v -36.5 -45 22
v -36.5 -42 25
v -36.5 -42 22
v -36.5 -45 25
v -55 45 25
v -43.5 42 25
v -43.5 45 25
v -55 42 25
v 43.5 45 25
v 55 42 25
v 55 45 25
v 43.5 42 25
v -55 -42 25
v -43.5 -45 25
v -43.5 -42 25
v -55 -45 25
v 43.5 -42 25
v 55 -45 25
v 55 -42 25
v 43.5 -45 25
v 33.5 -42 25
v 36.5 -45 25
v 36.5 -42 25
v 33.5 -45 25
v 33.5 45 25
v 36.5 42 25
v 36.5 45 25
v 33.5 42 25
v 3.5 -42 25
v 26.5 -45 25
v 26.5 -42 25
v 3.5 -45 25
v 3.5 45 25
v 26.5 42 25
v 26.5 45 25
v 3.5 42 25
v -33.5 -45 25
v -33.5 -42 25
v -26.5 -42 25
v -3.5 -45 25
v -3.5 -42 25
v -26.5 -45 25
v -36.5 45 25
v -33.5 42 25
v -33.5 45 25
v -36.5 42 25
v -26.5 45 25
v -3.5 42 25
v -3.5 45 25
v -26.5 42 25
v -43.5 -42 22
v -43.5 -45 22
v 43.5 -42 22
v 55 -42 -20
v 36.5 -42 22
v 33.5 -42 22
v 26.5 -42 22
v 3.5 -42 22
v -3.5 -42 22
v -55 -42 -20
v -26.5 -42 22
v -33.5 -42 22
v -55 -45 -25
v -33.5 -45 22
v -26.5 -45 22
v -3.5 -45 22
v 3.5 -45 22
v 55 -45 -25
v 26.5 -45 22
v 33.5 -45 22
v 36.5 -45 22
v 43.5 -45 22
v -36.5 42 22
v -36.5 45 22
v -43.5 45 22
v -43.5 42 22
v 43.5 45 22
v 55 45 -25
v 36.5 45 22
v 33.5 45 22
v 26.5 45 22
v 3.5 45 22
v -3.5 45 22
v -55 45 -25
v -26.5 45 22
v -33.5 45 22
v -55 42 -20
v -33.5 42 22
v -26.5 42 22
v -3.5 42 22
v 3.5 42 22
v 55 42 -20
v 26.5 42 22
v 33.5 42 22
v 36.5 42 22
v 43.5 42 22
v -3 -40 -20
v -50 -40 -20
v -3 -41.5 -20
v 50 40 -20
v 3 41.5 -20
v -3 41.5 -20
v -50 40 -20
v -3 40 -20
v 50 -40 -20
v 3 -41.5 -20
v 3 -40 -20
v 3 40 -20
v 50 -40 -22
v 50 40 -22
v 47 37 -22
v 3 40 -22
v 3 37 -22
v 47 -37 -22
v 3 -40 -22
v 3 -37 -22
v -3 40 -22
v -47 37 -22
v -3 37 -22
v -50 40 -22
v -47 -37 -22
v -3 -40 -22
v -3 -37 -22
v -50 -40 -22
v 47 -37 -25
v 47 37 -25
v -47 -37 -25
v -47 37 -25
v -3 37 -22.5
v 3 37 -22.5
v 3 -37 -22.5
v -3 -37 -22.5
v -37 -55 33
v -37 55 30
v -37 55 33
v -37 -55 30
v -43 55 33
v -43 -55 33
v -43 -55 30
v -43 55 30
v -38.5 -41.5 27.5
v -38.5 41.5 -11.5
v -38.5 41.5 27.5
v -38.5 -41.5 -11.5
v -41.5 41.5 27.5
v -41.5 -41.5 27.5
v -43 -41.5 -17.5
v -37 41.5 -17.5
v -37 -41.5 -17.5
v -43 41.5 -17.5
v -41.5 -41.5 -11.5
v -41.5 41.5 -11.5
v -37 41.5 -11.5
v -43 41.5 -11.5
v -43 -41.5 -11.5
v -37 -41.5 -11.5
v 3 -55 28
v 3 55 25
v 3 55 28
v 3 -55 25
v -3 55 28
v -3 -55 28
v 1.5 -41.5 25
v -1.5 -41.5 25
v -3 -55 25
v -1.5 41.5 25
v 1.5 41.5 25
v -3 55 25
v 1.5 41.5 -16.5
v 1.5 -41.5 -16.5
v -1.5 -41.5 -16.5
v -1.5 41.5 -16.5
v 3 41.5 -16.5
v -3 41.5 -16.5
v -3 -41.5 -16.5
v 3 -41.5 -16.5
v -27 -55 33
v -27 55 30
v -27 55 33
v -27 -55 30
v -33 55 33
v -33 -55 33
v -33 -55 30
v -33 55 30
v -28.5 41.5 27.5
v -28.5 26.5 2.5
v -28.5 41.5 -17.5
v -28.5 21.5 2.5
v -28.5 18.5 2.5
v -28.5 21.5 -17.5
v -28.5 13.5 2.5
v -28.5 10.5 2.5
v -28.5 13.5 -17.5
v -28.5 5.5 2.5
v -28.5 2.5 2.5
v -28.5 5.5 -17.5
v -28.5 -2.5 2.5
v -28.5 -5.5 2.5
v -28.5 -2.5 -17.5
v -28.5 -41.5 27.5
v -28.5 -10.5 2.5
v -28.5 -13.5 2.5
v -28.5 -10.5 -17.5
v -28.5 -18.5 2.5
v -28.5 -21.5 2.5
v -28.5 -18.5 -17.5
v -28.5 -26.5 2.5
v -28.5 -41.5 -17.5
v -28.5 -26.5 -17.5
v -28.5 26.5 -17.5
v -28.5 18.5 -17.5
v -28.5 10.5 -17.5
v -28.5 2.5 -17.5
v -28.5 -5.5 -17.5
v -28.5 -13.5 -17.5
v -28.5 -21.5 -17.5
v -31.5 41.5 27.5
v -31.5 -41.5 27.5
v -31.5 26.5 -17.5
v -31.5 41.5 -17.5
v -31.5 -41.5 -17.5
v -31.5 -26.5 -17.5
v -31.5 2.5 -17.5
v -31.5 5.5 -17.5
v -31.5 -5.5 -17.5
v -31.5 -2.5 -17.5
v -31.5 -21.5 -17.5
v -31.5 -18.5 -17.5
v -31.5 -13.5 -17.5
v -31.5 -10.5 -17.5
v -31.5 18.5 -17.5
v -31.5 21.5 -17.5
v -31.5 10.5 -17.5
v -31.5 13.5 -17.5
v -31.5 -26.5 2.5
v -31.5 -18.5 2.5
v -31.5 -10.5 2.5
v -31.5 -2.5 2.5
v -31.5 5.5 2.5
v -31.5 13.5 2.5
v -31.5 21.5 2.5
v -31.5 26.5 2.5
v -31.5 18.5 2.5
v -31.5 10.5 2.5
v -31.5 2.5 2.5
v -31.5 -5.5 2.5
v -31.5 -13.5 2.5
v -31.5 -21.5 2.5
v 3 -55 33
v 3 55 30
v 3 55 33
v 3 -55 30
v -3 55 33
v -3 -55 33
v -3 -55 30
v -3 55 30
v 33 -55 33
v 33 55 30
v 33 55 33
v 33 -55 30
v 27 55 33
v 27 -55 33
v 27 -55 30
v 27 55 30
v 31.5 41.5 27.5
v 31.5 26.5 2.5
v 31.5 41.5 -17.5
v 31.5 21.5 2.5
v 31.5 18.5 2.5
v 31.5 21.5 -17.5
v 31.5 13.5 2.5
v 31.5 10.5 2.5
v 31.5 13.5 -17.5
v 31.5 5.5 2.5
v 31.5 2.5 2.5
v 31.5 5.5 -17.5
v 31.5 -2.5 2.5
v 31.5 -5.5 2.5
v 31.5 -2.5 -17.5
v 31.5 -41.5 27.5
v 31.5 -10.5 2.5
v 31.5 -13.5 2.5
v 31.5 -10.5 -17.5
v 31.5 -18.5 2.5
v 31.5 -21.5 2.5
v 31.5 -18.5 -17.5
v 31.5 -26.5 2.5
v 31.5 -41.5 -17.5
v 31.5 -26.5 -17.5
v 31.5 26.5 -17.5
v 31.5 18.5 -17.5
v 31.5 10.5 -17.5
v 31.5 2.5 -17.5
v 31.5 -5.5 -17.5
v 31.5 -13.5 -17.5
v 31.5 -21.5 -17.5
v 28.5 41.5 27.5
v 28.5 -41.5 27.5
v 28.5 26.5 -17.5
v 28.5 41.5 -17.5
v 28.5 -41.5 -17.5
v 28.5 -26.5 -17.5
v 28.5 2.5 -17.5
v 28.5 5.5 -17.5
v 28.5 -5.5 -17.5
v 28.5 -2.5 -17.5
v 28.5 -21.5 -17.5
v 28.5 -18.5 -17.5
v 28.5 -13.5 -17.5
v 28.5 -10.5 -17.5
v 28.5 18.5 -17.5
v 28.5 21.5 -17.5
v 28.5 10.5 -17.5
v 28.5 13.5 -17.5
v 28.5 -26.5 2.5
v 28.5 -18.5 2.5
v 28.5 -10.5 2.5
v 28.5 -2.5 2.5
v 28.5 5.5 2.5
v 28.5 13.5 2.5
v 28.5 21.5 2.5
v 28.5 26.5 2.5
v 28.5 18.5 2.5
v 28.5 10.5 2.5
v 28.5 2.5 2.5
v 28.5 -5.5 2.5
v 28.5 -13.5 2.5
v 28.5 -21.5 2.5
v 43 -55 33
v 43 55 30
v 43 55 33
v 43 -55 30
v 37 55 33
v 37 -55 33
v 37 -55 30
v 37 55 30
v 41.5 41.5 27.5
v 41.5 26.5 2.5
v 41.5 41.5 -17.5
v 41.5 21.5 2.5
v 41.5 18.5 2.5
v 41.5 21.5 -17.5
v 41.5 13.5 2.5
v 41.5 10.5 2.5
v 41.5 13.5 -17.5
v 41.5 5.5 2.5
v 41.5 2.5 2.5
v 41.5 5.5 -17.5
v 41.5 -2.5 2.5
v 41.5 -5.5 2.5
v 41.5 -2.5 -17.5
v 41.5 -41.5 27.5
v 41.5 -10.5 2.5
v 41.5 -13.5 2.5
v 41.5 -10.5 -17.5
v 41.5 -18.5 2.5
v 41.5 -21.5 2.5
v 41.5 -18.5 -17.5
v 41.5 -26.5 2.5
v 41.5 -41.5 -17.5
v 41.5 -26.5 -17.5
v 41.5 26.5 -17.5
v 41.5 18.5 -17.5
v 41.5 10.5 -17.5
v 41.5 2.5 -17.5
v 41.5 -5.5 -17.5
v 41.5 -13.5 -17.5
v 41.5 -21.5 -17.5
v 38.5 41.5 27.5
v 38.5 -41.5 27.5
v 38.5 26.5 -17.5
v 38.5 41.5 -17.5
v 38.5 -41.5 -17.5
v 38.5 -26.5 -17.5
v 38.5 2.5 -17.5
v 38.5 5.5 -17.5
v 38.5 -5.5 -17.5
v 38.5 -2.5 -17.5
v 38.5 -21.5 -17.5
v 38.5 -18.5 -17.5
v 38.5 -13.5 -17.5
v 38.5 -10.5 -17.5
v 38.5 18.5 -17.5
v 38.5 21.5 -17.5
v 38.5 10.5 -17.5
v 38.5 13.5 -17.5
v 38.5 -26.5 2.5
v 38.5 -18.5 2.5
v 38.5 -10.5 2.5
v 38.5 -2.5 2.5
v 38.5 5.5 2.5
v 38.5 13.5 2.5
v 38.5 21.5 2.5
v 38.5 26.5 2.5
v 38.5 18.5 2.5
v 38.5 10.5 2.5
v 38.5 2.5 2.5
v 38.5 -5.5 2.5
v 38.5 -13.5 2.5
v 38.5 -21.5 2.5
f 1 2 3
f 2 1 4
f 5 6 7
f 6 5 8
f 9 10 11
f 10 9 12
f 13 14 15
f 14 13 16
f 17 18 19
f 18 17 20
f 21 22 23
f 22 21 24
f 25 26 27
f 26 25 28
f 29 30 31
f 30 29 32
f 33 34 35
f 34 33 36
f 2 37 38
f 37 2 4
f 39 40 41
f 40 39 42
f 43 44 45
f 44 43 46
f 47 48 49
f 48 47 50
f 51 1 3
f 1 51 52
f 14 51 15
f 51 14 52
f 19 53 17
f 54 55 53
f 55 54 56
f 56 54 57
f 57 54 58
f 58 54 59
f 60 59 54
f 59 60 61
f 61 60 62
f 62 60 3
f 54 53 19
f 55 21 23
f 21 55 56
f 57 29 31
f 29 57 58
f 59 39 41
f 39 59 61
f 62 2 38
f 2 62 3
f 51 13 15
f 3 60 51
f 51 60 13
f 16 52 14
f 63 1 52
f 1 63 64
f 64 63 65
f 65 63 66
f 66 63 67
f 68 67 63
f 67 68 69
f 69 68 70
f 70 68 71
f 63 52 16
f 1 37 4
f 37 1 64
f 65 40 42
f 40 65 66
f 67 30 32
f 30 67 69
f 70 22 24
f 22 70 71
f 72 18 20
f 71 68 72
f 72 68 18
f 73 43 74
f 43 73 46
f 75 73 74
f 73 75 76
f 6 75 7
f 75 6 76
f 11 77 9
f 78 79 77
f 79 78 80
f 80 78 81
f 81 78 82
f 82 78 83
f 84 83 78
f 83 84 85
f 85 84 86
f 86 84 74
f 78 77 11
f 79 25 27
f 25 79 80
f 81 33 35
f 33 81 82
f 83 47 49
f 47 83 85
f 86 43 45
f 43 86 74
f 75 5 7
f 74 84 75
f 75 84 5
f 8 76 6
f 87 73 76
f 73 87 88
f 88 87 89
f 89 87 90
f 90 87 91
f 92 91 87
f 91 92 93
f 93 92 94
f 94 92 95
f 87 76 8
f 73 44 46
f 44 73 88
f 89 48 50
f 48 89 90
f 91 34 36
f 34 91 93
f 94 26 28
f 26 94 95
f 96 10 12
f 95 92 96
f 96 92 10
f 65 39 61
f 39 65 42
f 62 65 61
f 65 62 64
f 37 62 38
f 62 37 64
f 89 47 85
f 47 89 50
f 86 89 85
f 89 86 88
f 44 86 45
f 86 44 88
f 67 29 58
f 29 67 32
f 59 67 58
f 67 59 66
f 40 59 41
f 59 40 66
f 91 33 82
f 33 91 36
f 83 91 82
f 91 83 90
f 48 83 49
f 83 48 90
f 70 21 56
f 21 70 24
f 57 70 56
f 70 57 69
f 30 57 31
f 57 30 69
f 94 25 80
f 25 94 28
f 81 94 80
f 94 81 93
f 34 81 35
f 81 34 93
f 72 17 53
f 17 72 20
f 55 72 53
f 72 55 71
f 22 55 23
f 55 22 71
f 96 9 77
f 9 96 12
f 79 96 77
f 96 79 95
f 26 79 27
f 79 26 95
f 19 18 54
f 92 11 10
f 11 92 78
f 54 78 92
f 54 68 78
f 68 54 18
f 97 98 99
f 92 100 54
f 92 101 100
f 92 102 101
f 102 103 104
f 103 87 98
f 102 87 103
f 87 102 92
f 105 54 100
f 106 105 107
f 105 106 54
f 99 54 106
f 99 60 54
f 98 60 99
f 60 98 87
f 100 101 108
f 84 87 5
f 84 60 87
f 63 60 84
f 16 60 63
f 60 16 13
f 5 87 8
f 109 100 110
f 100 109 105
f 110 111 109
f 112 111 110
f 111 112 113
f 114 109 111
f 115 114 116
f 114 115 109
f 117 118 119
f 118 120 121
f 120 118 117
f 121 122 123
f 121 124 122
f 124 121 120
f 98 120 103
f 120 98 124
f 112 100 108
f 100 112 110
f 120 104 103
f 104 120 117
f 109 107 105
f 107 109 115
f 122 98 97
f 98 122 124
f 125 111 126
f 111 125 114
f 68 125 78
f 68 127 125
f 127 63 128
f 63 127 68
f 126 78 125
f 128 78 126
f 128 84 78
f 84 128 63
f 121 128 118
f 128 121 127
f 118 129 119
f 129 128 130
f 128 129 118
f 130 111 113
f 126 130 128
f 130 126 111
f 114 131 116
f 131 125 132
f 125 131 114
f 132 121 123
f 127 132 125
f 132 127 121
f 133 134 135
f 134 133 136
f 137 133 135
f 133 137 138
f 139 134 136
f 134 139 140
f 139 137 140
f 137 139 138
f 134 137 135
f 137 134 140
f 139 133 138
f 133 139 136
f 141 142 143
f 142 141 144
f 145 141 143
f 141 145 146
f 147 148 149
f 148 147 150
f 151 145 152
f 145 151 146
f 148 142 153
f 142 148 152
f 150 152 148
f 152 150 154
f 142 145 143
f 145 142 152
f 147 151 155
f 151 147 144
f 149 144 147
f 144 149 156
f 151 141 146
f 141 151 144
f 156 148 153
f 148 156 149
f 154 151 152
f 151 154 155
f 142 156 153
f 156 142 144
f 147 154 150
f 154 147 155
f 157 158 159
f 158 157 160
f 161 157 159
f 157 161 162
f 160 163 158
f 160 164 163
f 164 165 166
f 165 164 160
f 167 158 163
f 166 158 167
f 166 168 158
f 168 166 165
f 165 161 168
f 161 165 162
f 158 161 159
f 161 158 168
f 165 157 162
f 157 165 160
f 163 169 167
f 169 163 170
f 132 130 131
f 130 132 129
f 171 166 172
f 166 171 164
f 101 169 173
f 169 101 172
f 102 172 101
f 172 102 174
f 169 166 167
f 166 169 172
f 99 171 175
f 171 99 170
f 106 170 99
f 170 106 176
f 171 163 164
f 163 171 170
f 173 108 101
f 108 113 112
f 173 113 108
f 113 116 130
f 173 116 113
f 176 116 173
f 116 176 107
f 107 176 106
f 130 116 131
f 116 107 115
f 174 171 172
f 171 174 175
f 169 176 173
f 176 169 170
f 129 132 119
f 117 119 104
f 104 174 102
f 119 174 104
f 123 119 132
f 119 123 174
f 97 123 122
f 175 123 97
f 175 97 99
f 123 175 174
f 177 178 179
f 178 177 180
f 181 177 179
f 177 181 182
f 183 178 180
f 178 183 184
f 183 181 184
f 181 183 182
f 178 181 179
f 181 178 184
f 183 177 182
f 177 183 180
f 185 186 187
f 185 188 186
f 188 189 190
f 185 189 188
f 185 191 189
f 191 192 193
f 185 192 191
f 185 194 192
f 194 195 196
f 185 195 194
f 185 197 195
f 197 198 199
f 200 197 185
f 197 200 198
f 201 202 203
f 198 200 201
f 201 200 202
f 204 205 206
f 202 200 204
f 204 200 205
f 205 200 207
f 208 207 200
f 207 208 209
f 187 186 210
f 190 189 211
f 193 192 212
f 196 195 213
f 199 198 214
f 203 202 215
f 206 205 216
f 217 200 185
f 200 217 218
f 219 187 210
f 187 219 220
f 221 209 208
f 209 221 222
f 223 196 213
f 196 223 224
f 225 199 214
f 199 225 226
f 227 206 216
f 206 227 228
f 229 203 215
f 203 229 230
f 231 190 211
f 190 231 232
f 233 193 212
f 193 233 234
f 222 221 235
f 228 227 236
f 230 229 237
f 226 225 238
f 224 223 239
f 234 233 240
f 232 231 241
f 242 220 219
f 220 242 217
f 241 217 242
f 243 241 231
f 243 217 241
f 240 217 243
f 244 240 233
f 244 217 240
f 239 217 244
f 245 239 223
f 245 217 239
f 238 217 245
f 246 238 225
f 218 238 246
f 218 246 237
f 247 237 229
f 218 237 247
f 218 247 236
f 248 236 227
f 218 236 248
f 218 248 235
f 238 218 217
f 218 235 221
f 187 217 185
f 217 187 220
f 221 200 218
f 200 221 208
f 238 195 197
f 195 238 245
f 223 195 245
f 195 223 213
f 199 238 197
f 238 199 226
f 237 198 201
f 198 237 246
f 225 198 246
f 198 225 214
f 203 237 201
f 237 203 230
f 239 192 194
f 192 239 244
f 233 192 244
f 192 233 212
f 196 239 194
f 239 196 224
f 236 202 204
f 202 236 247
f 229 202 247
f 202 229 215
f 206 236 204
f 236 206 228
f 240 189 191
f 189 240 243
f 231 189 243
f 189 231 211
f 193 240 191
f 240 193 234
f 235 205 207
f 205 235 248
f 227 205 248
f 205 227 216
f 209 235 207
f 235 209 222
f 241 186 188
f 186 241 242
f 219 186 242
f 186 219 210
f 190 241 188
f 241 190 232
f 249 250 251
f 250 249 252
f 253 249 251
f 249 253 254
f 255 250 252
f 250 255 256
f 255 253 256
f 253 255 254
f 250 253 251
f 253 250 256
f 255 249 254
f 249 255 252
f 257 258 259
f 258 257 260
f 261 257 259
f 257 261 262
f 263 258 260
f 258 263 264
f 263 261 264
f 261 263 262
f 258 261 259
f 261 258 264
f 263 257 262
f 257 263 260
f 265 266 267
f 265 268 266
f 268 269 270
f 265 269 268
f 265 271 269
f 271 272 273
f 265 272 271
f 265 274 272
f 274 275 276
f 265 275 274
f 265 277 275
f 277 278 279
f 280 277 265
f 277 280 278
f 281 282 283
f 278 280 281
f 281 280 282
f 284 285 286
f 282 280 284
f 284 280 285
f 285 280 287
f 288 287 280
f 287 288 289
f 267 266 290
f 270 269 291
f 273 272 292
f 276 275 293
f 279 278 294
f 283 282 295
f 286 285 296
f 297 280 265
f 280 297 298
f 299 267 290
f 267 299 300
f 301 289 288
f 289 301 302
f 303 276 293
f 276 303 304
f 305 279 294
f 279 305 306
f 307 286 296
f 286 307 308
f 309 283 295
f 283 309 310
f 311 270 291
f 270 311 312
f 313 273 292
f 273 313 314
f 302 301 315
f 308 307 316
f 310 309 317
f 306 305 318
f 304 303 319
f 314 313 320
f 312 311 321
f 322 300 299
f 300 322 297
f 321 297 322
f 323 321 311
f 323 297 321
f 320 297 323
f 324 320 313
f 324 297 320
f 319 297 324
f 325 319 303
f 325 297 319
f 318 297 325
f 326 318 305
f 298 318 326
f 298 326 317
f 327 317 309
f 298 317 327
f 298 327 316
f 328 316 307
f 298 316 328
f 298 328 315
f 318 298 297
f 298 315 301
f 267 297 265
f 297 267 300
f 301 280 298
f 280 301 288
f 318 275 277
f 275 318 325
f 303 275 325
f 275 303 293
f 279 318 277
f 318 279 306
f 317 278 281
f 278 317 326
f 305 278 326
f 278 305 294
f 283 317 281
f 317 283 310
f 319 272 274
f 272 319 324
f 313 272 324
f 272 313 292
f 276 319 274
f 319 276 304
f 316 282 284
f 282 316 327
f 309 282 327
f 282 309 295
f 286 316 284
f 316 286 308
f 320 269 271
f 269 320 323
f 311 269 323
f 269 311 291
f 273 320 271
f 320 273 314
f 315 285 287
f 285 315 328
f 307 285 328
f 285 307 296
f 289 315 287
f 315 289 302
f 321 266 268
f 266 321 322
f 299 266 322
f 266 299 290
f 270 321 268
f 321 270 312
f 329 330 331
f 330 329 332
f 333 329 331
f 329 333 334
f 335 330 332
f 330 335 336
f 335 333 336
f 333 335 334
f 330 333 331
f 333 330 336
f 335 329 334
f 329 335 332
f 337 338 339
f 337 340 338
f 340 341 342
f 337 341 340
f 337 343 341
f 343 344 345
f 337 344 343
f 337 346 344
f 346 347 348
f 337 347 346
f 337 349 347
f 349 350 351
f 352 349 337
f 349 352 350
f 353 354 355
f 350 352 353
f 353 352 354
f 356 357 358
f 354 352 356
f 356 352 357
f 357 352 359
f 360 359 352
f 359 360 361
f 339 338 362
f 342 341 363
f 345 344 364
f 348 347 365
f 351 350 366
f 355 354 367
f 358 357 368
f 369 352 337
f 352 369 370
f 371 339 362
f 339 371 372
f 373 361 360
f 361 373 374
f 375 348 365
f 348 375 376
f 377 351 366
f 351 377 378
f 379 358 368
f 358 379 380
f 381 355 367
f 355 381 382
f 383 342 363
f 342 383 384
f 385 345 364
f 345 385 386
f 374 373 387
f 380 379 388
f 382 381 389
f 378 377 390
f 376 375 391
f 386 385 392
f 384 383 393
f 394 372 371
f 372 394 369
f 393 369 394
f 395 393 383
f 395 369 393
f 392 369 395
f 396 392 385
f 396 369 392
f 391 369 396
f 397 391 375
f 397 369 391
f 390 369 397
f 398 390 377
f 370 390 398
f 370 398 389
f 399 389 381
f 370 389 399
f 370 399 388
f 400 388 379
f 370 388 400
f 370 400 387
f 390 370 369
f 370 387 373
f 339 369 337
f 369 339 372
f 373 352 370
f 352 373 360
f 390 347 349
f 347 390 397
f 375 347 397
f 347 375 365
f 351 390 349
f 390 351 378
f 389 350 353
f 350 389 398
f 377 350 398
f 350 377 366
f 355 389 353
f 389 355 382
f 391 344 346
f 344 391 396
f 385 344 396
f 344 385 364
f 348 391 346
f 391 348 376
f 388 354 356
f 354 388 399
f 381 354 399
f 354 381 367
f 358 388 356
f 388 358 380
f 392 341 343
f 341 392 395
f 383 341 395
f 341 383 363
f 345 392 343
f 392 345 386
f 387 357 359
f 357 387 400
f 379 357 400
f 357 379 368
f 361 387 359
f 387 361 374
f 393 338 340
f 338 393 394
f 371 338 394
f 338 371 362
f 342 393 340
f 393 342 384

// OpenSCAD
$fn = 50;

wall = 3;

ext_sz_x = 110;
ext_sz_y = 90;
ext_sz_z = 50;

acryl_sz_x = 100;
acryl_sz_y = 80;
acryl_sz_z = 2;

bottom_sz_z = acryl_sz_z + wall;

int_sz_y = ext_sz_y - 2 * wall;
int_sz_z = ext_sz_z - bottom_sz_z;

insert_x_pos = [-ext_sz_x/2+15, -ext_sz_x/2+25, 0, ext_sz_x/2-25, ext_sz_x/2-15];
insert_sz_x = 6;
insert_sz_y = (ext_sz_y - int_sz_y)/2;
insert_sz_z = 3;

gap = 0.5;

rubber_sz_z = 6;
rubber_sz_x = 1.5;

tooth_sz_z = 20;
tooth_sz_y = 5;
tooth_gap_y = 3;

module gel_container() {
	difference() {
		cube([ext_sz_x, ext_sz_y, ext_sz_z], center = true);
		union() {
			for(xpos=insert_x_pos) {
				for(ysgn=[-1, 1]) {
					// top inserts
					translate([xpos, ysgn * (ext_sz_y-insert_sz_y)/2, (ext_sz_z-insert_sz_z)/2]) {
						cube([insert_sz_x+2*gap, insert_sz_y, insert_sz_z], center = true);
					}
				}
			}
			// internal emptiness
			translate([0, 0, bottom_sz_z + insert_sz_z/2]) {
				cube([ext_sz_x, int_sz_y, ext_sz_z + insert_sz_z], center = true);
			}
			// acrylic place
			translate([0, 0, bottom_sz_z-acryl_sz_z]) {
				cube([acryl_sz_x, acryl_sz_y, ext_sz_z], center = true);
			}
			// transparent hole
			cube([acryl_sz_x-2*wall, acryl_sz_y-2*wall, ext_sz_z], center = true);
		}
	}
}

module wall_insert() {
	// handle
	translate([0, 0, (ext_sz_z+insert_sz_z)/2]) {
		cube([insert_sz_x, ext_sz_y + 20, insert_sz_z], center=true);
	}
	// thiner part whole height
	cube([insert_sz_x-2*rubber_sz_x, int_sz_y-2*gap, int_sz_z], center=true);
	// thicker part above rubber
	translate([0, 0, (-int_sz_z + rubber_sz_z)/2]) {
		cube([insert_sz_x, int_sz_y-2*gap, rubber_sz_z], center=true);
	}
}

module comb() {
	difference() {
		union() {
			// handle
			translate([0, 0, (ext_sz_z+insert_sz_z)/2]) {
				cube([insert_sz_x, ext_sz_y + 20, insert_sz_z], center=true);
			}
			// thiner part whole height
			cube([insert_sz_x-2*rubber_sz_x, int_sz_y-2*gap, int_sz_z], center=true);
		}
		for(ypos=[0:3]) {
			for(ysgn=[-1,1]) {
				translate([0, ysgn*(ypos*(tooth_sz_y+tooth_gap_y)), (-int_sz_z+tooth_sz_z)/2]) {
					cube([insert_sz_x, tooth_sz_y, tooth_sz_z], center=true);
				}
			}
		}
	}
}

gel_container();
for(xpos=[insert_x_pos[0], insert_x_pos[-1]]) {
	translate([xpos, 0, bottom_sz_z]) {
		wall_insert();
	}
}
for(xi=[1:len(insert_x_pos)-1]) {
	translate([insert_x_pos[xi], 0, bottom_sz_z]) {
		comb();
	}
}
